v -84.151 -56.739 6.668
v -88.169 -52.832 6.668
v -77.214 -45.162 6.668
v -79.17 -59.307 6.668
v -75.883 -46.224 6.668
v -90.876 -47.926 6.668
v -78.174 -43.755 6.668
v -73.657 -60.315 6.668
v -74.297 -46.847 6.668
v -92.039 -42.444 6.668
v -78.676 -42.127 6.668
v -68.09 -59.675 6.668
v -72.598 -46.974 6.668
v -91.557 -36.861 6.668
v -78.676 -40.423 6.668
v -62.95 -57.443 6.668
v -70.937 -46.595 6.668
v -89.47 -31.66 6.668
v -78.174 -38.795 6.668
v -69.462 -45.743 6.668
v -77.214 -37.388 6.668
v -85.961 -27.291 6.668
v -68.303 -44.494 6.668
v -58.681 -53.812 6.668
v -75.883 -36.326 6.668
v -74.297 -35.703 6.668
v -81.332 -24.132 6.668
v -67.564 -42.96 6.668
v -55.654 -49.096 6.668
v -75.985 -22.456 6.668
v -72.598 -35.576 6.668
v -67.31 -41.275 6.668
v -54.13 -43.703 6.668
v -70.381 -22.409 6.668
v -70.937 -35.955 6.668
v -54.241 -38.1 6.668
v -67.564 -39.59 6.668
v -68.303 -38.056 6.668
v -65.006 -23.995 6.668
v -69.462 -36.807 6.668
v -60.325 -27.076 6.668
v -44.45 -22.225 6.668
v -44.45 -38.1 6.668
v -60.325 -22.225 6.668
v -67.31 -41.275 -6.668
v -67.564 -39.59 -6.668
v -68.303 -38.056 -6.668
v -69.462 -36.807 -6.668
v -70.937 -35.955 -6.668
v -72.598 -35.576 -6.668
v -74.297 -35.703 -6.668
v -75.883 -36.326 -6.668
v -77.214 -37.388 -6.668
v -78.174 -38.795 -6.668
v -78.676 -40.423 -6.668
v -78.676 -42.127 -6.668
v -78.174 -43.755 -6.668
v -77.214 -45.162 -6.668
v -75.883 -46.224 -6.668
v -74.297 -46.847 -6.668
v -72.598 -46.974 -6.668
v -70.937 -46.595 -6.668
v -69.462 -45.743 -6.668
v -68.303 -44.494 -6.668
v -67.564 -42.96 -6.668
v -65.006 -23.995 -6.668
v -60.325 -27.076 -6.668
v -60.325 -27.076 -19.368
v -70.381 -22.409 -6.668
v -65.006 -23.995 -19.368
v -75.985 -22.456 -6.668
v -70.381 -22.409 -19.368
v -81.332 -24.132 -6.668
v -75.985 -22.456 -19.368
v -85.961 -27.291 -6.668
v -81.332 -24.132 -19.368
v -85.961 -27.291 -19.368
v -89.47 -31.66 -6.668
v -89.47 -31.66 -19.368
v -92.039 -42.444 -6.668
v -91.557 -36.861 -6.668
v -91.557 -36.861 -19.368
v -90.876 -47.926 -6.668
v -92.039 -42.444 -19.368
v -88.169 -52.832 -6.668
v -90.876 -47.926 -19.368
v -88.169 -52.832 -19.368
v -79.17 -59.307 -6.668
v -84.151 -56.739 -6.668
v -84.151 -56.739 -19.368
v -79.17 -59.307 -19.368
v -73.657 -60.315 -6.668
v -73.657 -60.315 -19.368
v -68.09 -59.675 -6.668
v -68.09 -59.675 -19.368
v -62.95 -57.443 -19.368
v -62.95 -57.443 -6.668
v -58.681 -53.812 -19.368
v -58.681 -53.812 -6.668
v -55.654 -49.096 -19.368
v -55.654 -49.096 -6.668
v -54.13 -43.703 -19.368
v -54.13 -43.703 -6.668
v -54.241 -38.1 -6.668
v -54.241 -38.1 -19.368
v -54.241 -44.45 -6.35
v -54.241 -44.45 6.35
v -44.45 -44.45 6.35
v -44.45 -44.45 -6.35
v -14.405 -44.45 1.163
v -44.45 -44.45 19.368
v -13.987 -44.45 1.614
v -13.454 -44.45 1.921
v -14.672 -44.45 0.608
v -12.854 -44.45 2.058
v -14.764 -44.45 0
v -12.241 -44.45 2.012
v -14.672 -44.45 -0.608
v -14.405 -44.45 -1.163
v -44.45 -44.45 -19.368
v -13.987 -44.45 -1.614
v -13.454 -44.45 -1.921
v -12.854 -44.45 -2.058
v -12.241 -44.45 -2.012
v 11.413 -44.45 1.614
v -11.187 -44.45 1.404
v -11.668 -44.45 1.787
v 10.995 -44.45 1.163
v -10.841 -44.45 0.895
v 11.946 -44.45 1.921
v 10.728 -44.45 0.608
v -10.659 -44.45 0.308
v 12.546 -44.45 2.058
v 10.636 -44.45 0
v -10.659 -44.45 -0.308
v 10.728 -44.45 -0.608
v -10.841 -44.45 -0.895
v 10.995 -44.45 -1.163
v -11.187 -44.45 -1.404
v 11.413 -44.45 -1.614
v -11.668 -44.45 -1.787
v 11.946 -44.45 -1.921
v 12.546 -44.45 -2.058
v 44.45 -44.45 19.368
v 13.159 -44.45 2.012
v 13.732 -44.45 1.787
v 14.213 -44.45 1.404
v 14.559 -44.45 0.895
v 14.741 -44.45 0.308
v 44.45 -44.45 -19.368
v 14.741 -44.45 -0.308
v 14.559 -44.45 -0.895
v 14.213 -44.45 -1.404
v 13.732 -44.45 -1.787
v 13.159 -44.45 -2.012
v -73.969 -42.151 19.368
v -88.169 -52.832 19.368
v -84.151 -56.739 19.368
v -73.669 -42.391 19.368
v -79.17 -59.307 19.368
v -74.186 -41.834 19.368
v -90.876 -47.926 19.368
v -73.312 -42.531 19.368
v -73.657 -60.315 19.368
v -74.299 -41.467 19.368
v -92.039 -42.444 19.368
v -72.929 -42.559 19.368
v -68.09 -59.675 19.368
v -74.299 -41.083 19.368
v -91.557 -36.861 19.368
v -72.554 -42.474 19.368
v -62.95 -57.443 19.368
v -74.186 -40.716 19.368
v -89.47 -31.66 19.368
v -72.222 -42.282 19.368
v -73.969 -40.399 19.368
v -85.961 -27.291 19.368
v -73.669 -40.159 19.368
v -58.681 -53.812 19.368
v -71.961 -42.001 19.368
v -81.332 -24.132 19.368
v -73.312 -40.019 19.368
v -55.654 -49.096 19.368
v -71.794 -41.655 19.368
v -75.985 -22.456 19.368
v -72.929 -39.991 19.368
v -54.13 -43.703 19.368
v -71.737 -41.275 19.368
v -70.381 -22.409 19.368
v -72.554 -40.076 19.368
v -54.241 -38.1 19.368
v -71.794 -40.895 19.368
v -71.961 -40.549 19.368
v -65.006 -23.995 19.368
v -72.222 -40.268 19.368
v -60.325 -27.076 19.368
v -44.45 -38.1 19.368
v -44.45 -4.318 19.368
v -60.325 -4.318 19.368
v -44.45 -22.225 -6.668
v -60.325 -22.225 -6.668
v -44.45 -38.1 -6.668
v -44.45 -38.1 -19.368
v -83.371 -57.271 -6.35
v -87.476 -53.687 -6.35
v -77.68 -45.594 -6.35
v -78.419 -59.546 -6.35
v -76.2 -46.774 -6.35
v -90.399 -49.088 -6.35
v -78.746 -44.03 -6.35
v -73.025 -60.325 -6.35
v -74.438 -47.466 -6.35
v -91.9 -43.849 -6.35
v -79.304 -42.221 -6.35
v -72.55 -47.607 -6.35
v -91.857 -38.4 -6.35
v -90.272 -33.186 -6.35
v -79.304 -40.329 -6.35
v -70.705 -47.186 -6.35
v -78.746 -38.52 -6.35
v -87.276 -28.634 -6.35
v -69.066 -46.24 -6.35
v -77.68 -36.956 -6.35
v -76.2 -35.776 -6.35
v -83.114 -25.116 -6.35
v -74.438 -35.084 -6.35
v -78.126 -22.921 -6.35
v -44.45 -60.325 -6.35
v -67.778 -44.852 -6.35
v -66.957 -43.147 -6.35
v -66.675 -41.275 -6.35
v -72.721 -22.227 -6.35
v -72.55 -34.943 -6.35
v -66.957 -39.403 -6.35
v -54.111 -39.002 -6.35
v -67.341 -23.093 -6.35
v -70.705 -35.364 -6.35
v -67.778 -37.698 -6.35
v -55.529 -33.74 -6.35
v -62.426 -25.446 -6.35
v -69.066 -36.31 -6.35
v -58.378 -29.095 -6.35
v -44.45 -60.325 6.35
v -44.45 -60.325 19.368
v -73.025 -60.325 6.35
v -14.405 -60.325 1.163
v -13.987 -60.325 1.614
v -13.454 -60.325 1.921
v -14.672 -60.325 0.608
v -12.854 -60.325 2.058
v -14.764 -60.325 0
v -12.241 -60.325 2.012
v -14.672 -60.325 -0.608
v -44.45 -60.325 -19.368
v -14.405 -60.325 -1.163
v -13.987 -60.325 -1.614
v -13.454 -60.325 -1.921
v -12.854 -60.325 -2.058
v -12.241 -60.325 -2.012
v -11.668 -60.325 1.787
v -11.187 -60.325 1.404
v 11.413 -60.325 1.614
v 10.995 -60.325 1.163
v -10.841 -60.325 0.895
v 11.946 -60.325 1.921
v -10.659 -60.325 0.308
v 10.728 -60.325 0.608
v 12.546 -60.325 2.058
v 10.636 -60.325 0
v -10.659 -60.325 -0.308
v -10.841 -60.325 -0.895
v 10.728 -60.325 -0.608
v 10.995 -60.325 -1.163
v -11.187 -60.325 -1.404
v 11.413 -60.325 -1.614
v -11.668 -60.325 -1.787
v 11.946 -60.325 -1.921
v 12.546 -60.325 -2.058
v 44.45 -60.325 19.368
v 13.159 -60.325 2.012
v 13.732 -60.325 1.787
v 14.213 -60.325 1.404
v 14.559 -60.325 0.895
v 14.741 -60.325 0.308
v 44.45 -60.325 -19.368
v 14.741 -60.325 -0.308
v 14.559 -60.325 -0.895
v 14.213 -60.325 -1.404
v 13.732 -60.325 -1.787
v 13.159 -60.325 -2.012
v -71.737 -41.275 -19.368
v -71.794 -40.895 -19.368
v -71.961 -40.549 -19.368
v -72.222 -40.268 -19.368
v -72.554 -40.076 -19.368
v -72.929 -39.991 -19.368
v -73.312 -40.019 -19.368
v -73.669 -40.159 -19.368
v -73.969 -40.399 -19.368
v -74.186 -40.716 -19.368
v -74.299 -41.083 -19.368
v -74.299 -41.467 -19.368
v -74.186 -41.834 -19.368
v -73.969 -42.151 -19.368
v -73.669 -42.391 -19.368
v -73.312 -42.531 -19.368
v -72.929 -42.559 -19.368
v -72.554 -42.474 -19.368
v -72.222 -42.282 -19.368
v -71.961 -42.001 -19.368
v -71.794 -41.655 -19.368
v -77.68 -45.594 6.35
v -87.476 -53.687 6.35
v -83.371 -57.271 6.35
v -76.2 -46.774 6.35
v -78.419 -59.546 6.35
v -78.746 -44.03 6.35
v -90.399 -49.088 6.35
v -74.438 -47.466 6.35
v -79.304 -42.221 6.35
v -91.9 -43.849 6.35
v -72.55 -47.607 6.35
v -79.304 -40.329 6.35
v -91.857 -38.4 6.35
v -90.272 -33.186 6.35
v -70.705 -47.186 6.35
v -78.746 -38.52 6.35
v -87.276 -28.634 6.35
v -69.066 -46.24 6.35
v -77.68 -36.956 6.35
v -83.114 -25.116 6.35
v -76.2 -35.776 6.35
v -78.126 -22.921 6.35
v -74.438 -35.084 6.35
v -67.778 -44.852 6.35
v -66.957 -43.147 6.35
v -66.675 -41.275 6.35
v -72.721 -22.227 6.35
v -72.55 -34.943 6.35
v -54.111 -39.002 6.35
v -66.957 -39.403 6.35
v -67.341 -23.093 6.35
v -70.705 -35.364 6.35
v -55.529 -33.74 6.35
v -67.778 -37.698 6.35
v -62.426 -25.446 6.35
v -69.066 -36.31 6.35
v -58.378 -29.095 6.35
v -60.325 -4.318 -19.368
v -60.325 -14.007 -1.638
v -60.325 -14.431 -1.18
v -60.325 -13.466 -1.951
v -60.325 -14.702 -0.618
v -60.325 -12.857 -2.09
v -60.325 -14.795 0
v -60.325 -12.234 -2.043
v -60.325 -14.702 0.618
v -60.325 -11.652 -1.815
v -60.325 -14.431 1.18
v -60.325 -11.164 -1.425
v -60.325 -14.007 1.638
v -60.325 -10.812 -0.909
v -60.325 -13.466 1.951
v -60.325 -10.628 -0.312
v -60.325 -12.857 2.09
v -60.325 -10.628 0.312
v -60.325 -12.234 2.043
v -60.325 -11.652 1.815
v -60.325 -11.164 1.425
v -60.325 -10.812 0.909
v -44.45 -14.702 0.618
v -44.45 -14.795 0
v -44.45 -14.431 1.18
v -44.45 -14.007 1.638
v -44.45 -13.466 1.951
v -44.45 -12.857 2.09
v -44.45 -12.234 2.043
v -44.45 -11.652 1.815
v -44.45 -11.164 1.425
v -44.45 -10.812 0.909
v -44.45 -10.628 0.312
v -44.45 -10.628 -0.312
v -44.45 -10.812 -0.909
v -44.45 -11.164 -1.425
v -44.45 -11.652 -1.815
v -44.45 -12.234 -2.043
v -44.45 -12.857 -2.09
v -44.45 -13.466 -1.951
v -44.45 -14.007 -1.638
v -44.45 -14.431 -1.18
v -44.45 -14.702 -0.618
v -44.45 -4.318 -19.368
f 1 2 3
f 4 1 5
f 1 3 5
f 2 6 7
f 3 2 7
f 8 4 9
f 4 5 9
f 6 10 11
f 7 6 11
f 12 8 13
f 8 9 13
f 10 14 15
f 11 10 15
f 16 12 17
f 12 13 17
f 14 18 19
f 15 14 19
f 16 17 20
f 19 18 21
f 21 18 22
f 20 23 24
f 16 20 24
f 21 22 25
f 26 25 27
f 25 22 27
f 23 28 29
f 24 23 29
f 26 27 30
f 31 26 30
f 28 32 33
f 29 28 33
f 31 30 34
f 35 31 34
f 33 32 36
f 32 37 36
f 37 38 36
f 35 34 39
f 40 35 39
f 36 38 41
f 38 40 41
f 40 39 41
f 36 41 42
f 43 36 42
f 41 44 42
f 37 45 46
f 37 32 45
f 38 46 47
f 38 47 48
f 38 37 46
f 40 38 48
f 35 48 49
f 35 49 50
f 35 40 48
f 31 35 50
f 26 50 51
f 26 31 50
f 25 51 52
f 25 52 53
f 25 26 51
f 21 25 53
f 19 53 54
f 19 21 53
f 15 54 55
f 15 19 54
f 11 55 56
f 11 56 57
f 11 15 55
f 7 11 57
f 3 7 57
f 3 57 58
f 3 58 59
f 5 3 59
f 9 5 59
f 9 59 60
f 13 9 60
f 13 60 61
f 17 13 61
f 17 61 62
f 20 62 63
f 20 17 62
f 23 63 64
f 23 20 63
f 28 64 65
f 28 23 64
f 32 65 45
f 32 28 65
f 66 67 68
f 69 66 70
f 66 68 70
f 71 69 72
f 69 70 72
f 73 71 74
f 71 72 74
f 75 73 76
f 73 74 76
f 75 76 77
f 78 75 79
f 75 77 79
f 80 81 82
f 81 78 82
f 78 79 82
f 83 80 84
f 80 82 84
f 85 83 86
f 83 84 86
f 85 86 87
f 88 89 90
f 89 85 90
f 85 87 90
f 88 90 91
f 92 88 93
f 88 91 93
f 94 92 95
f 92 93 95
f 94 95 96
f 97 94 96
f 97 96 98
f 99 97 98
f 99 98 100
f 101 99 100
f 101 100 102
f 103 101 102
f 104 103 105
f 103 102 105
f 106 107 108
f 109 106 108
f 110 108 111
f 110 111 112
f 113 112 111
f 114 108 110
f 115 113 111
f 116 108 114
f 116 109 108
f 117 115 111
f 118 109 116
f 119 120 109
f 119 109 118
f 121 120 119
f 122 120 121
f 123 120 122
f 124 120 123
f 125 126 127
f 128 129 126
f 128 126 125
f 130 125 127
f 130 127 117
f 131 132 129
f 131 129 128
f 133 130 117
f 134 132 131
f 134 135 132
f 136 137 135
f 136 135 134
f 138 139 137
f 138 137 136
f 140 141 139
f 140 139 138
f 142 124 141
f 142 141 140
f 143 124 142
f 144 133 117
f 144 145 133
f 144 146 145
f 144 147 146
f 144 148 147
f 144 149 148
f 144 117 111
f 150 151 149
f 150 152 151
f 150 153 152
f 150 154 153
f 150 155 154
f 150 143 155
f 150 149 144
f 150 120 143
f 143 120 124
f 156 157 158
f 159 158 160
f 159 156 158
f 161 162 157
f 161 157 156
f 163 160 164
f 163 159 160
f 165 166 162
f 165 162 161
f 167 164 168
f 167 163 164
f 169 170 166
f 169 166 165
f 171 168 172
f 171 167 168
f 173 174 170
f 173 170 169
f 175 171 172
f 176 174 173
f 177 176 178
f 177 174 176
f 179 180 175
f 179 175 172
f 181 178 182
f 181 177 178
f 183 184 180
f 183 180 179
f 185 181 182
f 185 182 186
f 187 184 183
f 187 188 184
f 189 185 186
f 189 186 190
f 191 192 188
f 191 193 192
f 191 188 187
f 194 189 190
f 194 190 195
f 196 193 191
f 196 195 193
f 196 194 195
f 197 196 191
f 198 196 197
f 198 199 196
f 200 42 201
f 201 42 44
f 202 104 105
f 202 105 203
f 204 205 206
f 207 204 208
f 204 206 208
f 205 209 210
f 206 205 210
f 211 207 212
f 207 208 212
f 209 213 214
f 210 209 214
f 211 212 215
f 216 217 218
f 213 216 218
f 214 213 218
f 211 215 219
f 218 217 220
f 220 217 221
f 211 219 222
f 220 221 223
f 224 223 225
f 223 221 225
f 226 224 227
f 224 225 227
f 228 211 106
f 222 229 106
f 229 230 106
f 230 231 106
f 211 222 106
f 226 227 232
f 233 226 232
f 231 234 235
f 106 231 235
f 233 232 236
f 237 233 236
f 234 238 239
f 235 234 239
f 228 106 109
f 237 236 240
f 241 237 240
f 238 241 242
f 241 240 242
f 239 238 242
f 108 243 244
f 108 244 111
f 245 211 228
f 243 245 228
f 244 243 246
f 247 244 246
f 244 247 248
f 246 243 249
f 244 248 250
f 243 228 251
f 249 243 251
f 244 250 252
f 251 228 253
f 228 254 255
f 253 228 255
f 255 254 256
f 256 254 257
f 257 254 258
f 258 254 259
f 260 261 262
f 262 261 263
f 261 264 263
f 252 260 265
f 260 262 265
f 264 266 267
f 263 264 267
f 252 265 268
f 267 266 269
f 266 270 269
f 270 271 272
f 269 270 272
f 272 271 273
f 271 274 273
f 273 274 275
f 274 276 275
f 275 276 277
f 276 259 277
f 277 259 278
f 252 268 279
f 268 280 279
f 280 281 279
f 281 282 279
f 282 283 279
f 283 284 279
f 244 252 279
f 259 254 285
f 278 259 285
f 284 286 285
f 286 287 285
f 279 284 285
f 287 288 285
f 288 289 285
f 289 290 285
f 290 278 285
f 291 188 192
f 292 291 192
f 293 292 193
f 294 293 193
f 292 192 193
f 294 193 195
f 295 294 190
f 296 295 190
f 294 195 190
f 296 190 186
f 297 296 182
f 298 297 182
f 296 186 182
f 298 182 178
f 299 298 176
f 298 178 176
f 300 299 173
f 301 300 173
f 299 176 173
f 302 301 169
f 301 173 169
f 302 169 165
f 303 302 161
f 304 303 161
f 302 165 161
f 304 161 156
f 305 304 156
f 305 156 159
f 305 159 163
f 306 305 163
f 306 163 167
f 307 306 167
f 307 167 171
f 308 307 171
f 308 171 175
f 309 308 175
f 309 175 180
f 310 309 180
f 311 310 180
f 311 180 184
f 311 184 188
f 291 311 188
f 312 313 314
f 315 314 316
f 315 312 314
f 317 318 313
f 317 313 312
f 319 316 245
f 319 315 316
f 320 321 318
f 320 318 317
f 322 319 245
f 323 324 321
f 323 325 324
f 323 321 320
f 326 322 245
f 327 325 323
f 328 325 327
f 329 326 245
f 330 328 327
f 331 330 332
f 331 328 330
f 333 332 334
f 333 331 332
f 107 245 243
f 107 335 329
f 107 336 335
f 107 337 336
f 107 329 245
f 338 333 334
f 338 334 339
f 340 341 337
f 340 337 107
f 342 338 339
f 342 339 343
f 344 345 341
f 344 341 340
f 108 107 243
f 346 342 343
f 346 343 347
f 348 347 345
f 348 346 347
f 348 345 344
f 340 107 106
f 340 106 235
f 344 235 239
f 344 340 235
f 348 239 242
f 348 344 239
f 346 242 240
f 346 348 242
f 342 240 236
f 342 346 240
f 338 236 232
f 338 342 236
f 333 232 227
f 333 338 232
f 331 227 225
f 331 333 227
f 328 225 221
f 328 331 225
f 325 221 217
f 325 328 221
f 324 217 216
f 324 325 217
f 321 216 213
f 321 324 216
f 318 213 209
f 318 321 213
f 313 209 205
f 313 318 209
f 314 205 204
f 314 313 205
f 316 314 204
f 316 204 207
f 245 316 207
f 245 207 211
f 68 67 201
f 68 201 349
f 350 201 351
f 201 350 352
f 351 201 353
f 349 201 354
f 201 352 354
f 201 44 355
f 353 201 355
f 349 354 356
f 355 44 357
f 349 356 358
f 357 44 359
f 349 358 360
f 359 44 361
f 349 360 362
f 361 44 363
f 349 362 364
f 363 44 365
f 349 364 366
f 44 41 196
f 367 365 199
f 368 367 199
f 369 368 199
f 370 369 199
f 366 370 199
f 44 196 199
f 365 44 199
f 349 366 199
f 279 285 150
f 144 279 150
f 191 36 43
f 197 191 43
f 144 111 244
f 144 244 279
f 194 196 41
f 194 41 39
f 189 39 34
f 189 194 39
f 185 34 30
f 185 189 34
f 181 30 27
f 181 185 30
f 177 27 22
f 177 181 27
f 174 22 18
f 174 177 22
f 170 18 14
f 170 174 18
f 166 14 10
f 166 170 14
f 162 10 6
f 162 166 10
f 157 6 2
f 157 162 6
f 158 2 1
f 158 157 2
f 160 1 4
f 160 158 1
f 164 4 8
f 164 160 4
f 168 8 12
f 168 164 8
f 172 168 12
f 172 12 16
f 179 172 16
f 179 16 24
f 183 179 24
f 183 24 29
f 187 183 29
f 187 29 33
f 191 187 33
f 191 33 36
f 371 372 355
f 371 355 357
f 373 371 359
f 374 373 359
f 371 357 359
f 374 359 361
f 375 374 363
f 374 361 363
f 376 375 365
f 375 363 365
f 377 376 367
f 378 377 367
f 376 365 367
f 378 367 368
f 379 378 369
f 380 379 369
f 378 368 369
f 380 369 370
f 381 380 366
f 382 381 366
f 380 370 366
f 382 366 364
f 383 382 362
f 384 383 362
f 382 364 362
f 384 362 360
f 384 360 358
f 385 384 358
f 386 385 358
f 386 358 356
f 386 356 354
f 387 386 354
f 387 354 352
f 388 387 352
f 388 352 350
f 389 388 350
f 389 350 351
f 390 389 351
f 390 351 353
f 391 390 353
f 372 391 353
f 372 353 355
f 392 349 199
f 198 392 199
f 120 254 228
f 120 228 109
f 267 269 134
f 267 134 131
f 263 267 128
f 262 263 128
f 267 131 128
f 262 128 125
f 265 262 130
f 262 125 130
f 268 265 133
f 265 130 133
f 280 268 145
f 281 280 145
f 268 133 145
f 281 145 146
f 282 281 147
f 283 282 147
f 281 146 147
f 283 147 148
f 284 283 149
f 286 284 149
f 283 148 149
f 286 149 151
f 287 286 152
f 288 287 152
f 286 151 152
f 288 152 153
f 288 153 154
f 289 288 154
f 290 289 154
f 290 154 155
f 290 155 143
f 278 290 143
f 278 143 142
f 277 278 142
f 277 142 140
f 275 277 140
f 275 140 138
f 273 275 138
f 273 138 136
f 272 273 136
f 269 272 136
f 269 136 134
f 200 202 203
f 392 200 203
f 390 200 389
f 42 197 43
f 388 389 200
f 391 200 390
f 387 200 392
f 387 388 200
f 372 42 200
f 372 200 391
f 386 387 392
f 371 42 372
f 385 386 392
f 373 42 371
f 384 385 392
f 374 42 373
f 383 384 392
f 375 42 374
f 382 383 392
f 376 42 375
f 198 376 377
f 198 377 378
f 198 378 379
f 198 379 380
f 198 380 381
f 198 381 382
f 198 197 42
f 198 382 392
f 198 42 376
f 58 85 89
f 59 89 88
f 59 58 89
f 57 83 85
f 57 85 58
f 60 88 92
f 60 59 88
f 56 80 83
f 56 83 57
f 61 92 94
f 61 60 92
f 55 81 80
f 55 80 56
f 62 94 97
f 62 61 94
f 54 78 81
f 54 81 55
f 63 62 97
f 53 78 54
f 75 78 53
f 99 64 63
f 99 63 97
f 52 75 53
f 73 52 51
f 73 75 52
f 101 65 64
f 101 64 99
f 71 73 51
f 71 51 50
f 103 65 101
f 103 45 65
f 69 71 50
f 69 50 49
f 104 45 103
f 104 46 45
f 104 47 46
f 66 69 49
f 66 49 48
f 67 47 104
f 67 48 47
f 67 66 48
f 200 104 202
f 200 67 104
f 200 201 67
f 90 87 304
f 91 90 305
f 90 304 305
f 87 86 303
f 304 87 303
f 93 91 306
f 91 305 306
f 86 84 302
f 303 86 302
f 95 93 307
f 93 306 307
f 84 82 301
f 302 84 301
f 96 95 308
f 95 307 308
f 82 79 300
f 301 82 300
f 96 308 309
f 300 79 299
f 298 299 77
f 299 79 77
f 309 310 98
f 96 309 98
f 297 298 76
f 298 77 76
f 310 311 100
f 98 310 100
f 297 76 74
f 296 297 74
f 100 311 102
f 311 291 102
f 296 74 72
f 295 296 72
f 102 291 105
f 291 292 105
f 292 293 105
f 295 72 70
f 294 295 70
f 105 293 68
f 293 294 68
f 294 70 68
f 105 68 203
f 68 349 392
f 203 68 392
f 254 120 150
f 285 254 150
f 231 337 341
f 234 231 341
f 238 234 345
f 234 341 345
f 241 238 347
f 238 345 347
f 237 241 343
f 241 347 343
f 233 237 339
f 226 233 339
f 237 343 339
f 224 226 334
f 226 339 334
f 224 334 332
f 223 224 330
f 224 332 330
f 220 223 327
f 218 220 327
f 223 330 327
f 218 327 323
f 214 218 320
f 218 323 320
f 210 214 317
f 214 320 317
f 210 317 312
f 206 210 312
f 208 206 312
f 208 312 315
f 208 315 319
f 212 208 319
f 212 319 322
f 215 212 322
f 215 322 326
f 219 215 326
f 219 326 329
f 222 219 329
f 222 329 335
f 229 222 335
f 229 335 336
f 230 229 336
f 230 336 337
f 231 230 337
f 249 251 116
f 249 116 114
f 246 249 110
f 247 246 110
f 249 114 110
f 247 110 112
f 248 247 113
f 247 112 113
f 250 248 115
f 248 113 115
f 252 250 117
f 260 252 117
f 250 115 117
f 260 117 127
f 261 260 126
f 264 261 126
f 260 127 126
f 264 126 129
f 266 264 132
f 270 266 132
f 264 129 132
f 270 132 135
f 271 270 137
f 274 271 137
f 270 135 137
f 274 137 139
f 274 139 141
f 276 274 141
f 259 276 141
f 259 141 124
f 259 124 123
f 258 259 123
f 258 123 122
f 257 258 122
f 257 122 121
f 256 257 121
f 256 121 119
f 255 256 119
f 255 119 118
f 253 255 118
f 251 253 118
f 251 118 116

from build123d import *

# Parameters (mm, degrees)
SKETCH1_R           = 19.05
BOSS_EXTRUDE1_DEPTH = 6.35
BOSS_EXTRUDE2_DEPTH = 12.7
SKETCH3_R           = 6.35
CUT_EXTRUDE1_DEPTH  = 111.807045128
SKETCH4_R           = 5.715
BOSS_EXTRUDE3_DEPTH = 6.6675
BOSS_EXTRUDE4_START = 12.7
SKETCH5_R           = 19.05
BOSS_EXTRUDE4_DEPTH = 12.7
BOSS_EXTRUDE5_DEPTH = 12.7
BOSS_EXTRUDE6_REACH = 115.114
SKETCH7_W           = 15.875
SKETCH7_H           = 60.325
BOSS_EXTRUDE7_START = -25.7175
SKETCH8_W           = 88.9
SKETCH8_H           = 15.875
BOSS_EXTRUDE7_DEPTH = 38.735
SKETCH16_R          = 2.0955
CUT_EXTRUDE8_DEPTH  = 123.441848672
SKETCH17_R          = 2.06375
CUT_EXTRUDE9_DEPTH  = 126.16951778
SKETCH20_W          = 38.735
SKETCH20_H          = 42.418
CUT_EXTRUDE12_DEPTH = 123.441848672
SKETCH21_R          = 1.288075885
CUT_EXTRUDE13_DEPTH = 117.693236629


with BuildPart() as part:
    # Sketch1 → Boss-Extrude1 (new, symmetric)
    with BuildSketch(Plane.XY):
        with Locations((-73.025, -41.275)):
            Circle(SKETCH1_R)
    extrude(amount=BOSS_EXTRUDE1_DEPTH, both=True)

    # Sketch2 → Boss-Extrude2 (add)
    with BuildSketch(Plane.XY.offset(6.35)):
        with BuildLine():
            Line((-54.241446689, -44.45), (44.45, -44.45))
            Line((44.45, -44.45), (44.45, -60.325))
            Line((44.45, -60.325), (-73.025, -60.325))
            ThreePointArc((-73.025, -60.325), (-60.728277876, -55.824677831), (-54.241446689, -44.45))
        make_face()
    extrude(amount=-BOSS_EXTRUDE2_DEPTH)

    # Sketch3 → Cut-Extrude1 (cut, through all)
    with BuildSketch(Plane.XY.offset(6.35)):
        with Locations((-73.025, -41.275)):
            Circle(SKETCH3_R)
    extrude(amount=-CUT_EXTRUDE1_DEPTH, mode=Mode.SUBTRACT)

    # Sketch8 → Boss-Extrude7 (add)
    with BuildSketch(Plane.XY.offset(6.35).offset(BOSS_EXTRUDE7_START)):
        with Locations((0, -52.3875)):
            Rectangle(SKETCH8_W, SKETCH8_H)
    extrude(amount=BOSS_EXTRUDE7_DEPTH)

    # Sketch17 → Cut-Extrude9 (cut, through all)
    with BuildSketch(Plane(origin=(0, -44.45, 0), x_dir=(1, 0, 0), z_dir=(0, 1, 0))):
        with Locations(Location((-12.7, 0, 0), (0, 0, 180))):
            Circle(SKETCH17_R)
        with Locations(Location((12.7, 0, 0), (0, 0, 180))):
            Circle(SKETCH17_R)
    extrude(amount=-CUT_EXTRUDE9_DEPTH, mode=Mode.SUBTRACT)


with BuildPart() as body_2:
    # Sketch4 → Boss-Extrude3 (new, symmetric)
    with BuildSketch(Plane.XY):
        with Locations((-73.025, -41.275)):
            Circle(SKETCH4_R)
    extrude(amount=BOSS_EXTRUDE3_DEPTH, both=True)

    # Sketch5 → Boss-Extrude4 (add)
    with BuildSketch(Plane.XY.offset(6.6675).offset(BOSS_EXTRUDE4_START)):
        with Locations((-73.025, -41.275)):
            Circle(SKETCH5_R)
    boss_extrude4 = extrude(amount=-BOSS_EXTRUDE4_DEPTH)

    # Sketch6 → Boss-Extrude5 (add)
    with BuildSketch(Plane.XY.offset(19.3675)):
        with BuildLine():
            Line((-44.45, -38.1), (-44.45, 38.1))
            Line((-44.45, 38.1), (-60.325, 38.1))
            Line((-60.325, 38.1), (-60.325, -27.075968343))
            ThreePointArc((-60.325, -27.075968343), (-56.346095636, -32.070835224), (-54.241446689, -38.1))
            Line((-54.241446689, -38.1), (-44.45, -38.1))
        make_face()
    boss_extrude5 = extrude(amount=-BOSS_EXTRUDE5_DEPTH)

    # Mirror1: Boss-Extrude4, Boss-Extrude5 across plane
    add(boss_extrude4.mirror(Plane.XY))
    add(boss_extrude5.mirror(Plane.XY))

    # Sketch7 → Boss-Extrude6 (add, up to next)
    with BuildSketch(Plane(origin=(0, 0, 6.6675), x_dir=(-1, 0, 0), z_dir=(0, 0, -1)), mode=Mode.PRIVATE) as boss_extrude6_sk1:
        with Locations((52.3875, 7.9375)):
            Rectangle(SKETCH7_W, SKETCH7_H)
    boss_extrude6_tool1 = extrude(boss_extrude6_sk1.sketch, amount=BOSS_EXTRUDE6_REACH, mode=Mode.PRIVATE) - body_2.part
    add(boss_extrude6_tool1.solids().sort_by_distance((-52.3875, 7.9375, 6.6675))[0])

    # Sketch16 → Cut-Extrude8 (cut, through all)
    with BuildSketch(Plane.ZY.offset(60.325)):
        with Locations(Location((0, 12.7, 0), (0, 0, 270))):
            Circle(SKETCH16_R)
        with Locations(Location((0, -12.7, 0), (0, 0, 270))):
            Circle(SKETCH16_R)
    extrude(amount=-CUT_EXTRUDE8_DEPTH, mode=Mode.SUBTRACT)

    # Sketch20 → Cut-Extrude12 (cut, through all)
    with BuildSketch(Plane.ZY.offset(60.325)):
        with Locations((0, 16.891)):
            Rectangle(SKETCH20_W, SKETCH20_H)
    extrude(amount=-CUT_EXTRUDE12_DEPTH, mode=Mode.SUBTRACT)

    # Sketch21 → Cut-Extrude13 (cut, through all)
    with BuildSketch(Plane.XY.offset(19.3675)):
        with Locations((-73.025, -41.275)):
            Circle(SKETCH21_R)
    extrude(amount=-CUT_EXTRUDE13_DEPTH, mode=Mode.SUBTRACT)


solid = Compound([part.part, body_2.part])
